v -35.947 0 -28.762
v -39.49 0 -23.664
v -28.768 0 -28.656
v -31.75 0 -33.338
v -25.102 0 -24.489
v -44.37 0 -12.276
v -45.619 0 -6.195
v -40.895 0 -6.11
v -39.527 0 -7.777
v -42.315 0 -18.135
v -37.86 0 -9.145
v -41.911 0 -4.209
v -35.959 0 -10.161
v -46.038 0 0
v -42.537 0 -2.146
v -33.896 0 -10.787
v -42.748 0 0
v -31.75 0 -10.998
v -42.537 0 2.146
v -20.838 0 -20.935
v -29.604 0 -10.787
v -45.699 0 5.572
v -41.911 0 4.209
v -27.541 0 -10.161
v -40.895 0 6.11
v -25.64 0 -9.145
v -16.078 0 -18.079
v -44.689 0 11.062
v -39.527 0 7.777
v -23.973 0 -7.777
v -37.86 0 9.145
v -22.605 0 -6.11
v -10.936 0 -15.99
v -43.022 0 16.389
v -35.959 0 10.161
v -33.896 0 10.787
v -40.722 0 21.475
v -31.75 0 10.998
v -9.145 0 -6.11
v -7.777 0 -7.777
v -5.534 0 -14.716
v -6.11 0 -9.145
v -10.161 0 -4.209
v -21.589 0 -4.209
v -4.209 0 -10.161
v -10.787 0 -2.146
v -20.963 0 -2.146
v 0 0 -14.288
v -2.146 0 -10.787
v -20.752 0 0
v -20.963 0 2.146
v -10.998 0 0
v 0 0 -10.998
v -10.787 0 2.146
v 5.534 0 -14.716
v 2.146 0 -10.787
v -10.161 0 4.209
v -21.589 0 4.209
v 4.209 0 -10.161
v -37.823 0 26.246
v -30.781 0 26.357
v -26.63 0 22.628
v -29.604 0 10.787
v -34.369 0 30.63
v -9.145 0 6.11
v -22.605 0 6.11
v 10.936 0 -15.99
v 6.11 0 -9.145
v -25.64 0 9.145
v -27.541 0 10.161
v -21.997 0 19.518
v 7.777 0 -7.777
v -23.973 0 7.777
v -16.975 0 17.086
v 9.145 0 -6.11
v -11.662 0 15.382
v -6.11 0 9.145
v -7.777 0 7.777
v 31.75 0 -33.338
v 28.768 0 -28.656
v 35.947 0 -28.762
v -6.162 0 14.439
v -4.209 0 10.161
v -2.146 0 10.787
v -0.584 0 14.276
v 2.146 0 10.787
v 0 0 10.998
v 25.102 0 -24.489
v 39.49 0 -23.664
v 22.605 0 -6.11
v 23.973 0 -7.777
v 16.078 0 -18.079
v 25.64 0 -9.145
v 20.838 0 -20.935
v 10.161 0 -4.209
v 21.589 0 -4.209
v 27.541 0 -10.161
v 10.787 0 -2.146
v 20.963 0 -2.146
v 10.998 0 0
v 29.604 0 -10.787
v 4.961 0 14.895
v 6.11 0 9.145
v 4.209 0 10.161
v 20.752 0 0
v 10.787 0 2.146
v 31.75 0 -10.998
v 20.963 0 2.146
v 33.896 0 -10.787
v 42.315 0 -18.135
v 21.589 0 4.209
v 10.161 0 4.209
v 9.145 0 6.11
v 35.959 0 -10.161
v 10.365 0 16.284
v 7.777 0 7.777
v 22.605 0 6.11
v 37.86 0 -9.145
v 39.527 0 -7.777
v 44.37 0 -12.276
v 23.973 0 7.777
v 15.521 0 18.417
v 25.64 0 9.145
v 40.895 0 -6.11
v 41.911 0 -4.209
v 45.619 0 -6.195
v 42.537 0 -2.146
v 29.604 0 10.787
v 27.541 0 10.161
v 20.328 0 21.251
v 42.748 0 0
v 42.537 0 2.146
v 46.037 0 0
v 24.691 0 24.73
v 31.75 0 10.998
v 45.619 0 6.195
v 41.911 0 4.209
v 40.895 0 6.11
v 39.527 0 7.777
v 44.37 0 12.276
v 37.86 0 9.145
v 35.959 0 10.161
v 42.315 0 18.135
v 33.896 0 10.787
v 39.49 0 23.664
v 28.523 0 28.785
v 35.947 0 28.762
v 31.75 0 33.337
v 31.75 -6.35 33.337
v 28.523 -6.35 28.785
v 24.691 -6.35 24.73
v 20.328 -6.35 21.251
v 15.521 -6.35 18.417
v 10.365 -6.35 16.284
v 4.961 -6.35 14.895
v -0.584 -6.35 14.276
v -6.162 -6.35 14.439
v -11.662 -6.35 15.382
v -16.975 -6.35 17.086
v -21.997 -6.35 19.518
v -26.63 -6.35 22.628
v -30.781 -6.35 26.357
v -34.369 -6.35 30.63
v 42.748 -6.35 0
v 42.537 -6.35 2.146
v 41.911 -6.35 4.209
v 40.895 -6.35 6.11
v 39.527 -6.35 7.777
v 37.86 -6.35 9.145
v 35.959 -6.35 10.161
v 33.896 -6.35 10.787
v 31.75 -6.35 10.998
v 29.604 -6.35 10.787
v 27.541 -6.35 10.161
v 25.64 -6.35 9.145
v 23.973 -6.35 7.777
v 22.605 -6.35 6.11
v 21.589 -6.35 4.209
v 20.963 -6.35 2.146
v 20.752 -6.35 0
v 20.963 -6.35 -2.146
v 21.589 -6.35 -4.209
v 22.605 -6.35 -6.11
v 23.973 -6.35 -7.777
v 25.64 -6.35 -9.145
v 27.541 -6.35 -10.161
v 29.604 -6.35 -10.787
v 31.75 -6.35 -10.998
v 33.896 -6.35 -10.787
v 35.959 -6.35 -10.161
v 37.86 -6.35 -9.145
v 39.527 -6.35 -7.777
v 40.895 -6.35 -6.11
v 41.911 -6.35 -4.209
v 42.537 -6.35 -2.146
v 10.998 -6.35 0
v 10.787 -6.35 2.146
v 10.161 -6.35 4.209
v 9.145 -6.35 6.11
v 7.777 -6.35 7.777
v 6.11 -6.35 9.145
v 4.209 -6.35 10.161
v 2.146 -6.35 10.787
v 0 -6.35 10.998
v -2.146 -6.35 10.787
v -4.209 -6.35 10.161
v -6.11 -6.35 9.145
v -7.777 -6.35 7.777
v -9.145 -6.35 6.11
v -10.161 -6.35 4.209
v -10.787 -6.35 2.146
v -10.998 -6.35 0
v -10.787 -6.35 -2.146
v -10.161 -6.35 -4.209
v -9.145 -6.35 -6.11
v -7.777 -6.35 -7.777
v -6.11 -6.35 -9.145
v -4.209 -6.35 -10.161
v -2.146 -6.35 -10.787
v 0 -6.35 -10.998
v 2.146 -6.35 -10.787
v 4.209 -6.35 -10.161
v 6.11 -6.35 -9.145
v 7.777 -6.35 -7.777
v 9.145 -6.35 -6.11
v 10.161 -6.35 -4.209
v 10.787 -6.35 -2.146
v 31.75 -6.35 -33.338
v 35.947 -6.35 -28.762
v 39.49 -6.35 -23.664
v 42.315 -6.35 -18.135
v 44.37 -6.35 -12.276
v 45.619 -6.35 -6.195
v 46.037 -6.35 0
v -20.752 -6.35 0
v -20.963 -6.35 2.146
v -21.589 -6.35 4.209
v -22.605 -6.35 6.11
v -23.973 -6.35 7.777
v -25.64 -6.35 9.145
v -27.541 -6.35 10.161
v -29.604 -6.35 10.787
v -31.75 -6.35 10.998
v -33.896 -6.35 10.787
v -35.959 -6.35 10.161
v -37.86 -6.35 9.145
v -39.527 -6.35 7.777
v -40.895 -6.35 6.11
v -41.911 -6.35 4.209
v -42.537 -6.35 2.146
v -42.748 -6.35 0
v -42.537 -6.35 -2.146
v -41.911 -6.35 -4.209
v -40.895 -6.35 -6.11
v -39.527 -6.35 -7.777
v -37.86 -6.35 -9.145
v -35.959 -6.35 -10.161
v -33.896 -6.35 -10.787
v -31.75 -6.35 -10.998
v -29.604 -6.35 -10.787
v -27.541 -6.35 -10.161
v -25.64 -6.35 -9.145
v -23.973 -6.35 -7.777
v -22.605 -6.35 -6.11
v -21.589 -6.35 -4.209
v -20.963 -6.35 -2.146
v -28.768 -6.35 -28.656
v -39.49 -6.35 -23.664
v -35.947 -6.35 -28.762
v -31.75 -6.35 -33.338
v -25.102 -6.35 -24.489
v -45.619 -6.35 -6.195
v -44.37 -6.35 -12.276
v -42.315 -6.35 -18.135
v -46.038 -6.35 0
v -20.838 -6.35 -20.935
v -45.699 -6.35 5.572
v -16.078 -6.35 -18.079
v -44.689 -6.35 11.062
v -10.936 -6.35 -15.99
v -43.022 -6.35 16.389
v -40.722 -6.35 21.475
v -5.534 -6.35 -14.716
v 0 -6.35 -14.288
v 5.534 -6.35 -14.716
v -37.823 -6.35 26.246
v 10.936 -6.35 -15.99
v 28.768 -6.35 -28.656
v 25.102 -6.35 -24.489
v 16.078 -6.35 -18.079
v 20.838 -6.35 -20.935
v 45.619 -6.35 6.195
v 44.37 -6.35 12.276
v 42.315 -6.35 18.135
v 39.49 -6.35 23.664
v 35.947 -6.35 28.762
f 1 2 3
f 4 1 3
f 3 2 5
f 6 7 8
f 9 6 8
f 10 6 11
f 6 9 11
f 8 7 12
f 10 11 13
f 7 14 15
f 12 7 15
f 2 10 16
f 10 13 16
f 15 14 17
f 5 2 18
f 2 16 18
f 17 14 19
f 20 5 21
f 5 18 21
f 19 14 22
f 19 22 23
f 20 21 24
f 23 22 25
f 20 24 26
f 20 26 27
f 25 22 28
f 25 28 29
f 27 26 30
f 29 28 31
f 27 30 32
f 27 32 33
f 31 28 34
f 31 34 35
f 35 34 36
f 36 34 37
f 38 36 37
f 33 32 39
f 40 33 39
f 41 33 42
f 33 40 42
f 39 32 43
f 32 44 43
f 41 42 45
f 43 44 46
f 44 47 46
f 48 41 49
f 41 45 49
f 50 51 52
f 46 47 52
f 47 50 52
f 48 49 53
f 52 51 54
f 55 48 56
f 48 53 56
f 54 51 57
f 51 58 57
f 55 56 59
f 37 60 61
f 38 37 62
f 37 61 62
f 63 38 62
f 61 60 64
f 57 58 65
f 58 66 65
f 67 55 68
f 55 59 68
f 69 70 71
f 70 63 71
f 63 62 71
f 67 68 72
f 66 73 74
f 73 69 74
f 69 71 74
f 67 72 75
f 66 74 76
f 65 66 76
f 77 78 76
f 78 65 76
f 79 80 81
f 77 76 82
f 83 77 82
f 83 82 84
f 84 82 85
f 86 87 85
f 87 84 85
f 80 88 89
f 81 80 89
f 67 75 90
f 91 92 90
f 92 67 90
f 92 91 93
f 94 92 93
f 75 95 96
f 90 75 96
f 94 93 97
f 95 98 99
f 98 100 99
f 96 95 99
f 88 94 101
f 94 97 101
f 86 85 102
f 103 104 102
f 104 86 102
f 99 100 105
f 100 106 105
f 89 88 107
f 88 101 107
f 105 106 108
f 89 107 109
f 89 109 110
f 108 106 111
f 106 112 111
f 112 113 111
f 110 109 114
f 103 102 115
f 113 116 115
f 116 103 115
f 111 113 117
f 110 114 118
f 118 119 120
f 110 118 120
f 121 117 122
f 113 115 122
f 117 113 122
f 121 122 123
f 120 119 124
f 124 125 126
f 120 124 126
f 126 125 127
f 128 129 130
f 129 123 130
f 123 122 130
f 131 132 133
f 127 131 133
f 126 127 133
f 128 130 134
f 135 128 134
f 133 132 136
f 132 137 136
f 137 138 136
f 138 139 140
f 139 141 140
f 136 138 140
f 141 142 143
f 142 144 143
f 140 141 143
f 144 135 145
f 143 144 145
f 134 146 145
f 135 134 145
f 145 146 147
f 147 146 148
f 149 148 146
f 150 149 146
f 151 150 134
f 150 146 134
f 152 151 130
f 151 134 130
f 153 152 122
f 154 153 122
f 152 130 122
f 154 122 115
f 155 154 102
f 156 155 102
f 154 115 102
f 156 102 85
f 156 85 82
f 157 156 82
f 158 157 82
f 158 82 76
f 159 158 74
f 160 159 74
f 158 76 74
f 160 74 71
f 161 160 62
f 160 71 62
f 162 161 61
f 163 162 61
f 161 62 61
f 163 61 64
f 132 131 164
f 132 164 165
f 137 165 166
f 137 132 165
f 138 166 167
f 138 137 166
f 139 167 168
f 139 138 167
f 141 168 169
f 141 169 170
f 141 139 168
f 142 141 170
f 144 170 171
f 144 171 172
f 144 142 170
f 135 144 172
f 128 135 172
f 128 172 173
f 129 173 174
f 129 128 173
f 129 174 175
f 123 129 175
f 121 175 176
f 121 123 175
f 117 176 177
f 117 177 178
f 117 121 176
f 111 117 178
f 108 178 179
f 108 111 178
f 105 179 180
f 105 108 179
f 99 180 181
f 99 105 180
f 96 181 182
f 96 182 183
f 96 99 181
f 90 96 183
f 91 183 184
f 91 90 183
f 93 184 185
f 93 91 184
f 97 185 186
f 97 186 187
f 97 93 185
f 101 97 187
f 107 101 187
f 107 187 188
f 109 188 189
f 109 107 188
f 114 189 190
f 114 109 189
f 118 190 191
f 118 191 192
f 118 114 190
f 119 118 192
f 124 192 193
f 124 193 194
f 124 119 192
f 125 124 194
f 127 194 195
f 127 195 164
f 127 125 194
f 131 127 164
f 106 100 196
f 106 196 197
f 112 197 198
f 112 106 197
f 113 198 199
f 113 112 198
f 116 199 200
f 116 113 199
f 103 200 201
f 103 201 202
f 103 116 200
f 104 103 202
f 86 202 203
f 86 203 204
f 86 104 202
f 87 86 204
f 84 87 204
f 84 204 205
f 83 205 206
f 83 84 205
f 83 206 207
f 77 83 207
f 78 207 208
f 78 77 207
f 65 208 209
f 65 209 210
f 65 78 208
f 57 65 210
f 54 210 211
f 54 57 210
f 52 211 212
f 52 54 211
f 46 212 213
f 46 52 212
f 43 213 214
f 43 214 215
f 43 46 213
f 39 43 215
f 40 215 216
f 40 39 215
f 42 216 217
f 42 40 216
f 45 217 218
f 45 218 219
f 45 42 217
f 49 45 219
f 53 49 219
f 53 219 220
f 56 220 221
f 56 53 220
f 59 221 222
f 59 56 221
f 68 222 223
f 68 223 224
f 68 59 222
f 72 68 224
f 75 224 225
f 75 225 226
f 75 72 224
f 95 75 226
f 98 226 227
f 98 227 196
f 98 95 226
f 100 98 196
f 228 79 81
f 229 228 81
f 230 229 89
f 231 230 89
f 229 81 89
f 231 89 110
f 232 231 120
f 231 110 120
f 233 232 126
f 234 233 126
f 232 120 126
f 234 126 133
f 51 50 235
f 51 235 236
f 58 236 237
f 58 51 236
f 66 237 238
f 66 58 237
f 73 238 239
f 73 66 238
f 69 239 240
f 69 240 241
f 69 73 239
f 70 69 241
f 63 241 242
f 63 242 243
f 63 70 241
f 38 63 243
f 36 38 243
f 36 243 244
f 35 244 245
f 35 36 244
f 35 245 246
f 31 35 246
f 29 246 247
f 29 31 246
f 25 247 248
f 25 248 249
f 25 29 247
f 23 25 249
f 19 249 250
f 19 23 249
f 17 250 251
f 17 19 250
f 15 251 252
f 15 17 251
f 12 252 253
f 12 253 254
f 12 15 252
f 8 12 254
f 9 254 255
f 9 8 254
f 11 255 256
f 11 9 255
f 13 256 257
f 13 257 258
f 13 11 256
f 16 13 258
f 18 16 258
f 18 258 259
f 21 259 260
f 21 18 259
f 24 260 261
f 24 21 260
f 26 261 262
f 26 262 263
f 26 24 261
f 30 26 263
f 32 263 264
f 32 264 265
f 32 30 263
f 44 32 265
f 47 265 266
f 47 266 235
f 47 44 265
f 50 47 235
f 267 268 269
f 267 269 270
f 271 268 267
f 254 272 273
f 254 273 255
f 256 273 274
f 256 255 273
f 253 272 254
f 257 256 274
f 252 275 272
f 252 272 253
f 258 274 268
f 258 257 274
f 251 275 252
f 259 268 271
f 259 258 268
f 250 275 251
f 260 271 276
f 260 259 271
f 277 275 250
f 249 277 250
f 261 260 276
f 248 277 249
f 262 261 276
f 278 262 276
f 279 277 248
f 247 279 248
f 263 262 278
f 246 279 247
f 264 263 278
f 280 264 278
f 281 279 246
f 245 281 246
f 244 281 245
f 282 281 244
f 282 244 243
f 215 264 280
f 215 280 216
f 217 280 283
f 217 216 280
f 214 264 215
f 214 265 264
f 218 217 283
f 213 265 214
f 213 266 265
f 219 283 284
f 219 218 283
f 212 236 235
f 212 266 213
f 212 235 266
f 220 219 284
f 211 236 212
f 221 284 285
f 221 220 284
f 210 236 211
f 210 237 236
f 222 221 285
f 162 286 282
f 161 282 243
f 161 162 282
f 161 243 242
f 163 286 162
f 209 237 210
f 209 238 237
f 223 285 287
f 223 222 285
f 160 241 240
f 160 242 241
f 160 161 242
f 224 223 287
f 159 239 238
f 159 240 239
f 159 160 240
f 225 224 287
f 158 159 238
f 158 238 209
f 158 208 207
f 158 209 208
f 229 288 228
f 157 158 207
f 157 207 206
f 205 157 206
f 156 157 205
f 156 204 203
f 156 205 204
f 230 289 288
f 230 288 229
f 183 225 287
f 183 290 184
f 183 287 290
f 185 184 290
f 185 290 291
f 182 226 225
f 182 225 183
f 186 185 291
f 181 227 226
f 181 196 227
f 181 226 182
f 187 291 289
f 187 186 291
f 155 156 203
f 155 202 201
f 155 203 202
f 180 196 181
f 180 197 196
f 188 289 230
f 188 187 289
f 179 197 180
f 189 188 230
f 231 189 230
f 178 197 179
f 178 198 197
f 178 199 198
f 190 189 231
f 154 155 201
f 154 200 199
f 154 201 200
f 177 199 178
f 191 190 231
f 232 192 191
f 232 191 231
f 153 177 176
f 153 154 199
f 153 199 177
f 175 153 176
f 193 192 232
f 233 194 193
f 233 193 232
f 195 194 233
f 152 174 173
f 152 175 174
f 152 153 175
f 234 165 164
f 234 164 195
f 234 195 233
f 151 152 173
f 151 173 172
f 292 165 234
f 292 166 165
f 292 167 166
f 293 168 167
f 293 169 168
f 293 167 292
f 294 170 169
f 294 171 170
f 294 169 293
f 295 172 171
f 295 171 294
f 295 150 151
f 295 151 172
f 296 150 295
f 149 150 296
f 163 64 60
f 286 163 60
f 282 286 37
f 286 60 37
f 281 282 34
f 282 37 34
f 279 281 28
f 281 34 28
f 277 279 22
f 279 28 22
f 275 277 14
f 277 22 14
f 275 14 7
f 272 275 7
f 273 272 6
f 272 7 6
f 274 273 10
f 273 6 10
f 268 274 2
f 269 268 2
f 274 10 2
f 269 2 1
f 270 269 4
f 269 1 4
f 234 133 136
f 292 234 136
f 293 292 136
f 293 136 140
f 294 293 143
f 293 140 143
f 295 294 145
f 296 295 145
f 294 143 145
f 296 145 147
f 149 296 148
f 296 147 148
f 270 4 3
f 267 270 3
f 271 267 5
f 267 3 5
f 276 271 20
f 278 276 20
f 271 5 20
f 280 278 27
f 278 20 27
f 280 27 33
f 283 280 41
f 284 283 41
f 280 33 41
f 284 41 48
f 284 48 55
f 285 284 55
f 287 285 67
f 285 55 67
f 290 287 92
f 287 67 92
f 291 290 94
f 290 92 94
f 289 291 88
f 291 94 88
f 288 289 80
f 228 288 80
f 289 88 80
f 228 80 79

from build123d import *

# Parameters (mm, degrees)
F0_R     = 14.2875
F0_R_2   = 10.9982
F1_DEPTH = 6.35


with BuildPart() as f1:
    # F0 (on Front) → F1 (new body)
    with BuildSketch(Plane.XZ):
        with BuildLine():
            ThreePointArc((-0.5844780805, 14.2755399766), (9.8939861955, 10.3073611275), (14.2875, 0))
            ThreePointArc((14.2875, 0), (10.1027881233, -10.1027881491), (-3.66e-08, -14.2875))
            ThreePointArc((-3.66e-08, -14.2875), (18.5132722505, -19.415379547), (31.75, -33.3375))
            ThreePointArc((31.75, -33.3375), (42.3151393195, -18.1350597083), (46.0375, 0))
            ThreePointArc((46.0375, 0), (42.3151393195, 18.1350597083), (31.75, 33.3375))
            ThreePointArc((31.75, 33.3375), (17.9746422802, 19.7492124484), (-0.5844780805, 14.2755399766))
        make_face()
        with Locations((31.75, 0)):
            Circle(F0_R, mode=Mode.SUBTRACT)
        with BuildLine():
            ThreePointArc((-3.66e-08, -14.2875), (-14.2845096816, -0.2923001993), (-0.5844780805, 14.2755399766))
            ThreePointArc((-0.5844780805, 14.2755399766), (-19.5289453165, 18.2137151613), (-34.3690170298, 30.6304109449))
            ThreePointArc((-34.3690170298, 30.6304109449), (-43.021593548, 16.3888344563), (-46.0375, 1.611e-07))
            ThreePointArc((-46.0375, 1.611e-07), (-42.3151393512, -18.1350596343), (-31.75, -33.3375))
            ThreePointArc((-31.75, -33.3375), (-18.5132722818, -19.4153795658), (-3.66e-08, -14.2875))
        make_face()
        with BuildLine():
            ThreePointArc((-17.4625, 0), (-31.7500000805, -14.2875), (-46.0375, 1.611e-07))
            ThreePointArc((-46.0375, 1.611e-07), (-31.7499999195, 14.2875), (-17.4625, 0))
        make_face(mode=Mode.SUBTRACT)
        with BuildLine():
            ThreePointArc((-3.66e-08, -14.2875), (10.1027881233, -10.1027881491), (14.2875, 0))
            ThreePointArc((14.2875, 0), (9.8939861955, 10.3073611275), (-0.5844780805, 14.2755399766))
            ThreePointArc((-0.5844780805, 14.2755399766), (-14.2845096816, -0.2923001993), (-3.66e-08, -14.2875))
        make_face()
        Circle(F0_R_2, mode=Mode.SUBTRACT)
        with Locations((31.75, 0)):
            Circle(F0_R)
        with Locations((31.75, 0)):
            Circle(F0_R_2, mode=Mode.SUBTRACT)
        with BuildLine():
            ThreePointArc((-17.4625, 0), (-31.7499999195, 14.2875), (-46.0375, 1.611e-07))
            ThreePointArc((-46.0375, 1.611e-07), (-31.7500000805, -14.2875), (-17.4625, 0))
        make_face()
        with Locations((-31.75, 0)):
            Circle(F0_R_2, mode=Mode.SUBTRACT)
    extrude(amount=F1_DEPTH)


solid = f1.part
